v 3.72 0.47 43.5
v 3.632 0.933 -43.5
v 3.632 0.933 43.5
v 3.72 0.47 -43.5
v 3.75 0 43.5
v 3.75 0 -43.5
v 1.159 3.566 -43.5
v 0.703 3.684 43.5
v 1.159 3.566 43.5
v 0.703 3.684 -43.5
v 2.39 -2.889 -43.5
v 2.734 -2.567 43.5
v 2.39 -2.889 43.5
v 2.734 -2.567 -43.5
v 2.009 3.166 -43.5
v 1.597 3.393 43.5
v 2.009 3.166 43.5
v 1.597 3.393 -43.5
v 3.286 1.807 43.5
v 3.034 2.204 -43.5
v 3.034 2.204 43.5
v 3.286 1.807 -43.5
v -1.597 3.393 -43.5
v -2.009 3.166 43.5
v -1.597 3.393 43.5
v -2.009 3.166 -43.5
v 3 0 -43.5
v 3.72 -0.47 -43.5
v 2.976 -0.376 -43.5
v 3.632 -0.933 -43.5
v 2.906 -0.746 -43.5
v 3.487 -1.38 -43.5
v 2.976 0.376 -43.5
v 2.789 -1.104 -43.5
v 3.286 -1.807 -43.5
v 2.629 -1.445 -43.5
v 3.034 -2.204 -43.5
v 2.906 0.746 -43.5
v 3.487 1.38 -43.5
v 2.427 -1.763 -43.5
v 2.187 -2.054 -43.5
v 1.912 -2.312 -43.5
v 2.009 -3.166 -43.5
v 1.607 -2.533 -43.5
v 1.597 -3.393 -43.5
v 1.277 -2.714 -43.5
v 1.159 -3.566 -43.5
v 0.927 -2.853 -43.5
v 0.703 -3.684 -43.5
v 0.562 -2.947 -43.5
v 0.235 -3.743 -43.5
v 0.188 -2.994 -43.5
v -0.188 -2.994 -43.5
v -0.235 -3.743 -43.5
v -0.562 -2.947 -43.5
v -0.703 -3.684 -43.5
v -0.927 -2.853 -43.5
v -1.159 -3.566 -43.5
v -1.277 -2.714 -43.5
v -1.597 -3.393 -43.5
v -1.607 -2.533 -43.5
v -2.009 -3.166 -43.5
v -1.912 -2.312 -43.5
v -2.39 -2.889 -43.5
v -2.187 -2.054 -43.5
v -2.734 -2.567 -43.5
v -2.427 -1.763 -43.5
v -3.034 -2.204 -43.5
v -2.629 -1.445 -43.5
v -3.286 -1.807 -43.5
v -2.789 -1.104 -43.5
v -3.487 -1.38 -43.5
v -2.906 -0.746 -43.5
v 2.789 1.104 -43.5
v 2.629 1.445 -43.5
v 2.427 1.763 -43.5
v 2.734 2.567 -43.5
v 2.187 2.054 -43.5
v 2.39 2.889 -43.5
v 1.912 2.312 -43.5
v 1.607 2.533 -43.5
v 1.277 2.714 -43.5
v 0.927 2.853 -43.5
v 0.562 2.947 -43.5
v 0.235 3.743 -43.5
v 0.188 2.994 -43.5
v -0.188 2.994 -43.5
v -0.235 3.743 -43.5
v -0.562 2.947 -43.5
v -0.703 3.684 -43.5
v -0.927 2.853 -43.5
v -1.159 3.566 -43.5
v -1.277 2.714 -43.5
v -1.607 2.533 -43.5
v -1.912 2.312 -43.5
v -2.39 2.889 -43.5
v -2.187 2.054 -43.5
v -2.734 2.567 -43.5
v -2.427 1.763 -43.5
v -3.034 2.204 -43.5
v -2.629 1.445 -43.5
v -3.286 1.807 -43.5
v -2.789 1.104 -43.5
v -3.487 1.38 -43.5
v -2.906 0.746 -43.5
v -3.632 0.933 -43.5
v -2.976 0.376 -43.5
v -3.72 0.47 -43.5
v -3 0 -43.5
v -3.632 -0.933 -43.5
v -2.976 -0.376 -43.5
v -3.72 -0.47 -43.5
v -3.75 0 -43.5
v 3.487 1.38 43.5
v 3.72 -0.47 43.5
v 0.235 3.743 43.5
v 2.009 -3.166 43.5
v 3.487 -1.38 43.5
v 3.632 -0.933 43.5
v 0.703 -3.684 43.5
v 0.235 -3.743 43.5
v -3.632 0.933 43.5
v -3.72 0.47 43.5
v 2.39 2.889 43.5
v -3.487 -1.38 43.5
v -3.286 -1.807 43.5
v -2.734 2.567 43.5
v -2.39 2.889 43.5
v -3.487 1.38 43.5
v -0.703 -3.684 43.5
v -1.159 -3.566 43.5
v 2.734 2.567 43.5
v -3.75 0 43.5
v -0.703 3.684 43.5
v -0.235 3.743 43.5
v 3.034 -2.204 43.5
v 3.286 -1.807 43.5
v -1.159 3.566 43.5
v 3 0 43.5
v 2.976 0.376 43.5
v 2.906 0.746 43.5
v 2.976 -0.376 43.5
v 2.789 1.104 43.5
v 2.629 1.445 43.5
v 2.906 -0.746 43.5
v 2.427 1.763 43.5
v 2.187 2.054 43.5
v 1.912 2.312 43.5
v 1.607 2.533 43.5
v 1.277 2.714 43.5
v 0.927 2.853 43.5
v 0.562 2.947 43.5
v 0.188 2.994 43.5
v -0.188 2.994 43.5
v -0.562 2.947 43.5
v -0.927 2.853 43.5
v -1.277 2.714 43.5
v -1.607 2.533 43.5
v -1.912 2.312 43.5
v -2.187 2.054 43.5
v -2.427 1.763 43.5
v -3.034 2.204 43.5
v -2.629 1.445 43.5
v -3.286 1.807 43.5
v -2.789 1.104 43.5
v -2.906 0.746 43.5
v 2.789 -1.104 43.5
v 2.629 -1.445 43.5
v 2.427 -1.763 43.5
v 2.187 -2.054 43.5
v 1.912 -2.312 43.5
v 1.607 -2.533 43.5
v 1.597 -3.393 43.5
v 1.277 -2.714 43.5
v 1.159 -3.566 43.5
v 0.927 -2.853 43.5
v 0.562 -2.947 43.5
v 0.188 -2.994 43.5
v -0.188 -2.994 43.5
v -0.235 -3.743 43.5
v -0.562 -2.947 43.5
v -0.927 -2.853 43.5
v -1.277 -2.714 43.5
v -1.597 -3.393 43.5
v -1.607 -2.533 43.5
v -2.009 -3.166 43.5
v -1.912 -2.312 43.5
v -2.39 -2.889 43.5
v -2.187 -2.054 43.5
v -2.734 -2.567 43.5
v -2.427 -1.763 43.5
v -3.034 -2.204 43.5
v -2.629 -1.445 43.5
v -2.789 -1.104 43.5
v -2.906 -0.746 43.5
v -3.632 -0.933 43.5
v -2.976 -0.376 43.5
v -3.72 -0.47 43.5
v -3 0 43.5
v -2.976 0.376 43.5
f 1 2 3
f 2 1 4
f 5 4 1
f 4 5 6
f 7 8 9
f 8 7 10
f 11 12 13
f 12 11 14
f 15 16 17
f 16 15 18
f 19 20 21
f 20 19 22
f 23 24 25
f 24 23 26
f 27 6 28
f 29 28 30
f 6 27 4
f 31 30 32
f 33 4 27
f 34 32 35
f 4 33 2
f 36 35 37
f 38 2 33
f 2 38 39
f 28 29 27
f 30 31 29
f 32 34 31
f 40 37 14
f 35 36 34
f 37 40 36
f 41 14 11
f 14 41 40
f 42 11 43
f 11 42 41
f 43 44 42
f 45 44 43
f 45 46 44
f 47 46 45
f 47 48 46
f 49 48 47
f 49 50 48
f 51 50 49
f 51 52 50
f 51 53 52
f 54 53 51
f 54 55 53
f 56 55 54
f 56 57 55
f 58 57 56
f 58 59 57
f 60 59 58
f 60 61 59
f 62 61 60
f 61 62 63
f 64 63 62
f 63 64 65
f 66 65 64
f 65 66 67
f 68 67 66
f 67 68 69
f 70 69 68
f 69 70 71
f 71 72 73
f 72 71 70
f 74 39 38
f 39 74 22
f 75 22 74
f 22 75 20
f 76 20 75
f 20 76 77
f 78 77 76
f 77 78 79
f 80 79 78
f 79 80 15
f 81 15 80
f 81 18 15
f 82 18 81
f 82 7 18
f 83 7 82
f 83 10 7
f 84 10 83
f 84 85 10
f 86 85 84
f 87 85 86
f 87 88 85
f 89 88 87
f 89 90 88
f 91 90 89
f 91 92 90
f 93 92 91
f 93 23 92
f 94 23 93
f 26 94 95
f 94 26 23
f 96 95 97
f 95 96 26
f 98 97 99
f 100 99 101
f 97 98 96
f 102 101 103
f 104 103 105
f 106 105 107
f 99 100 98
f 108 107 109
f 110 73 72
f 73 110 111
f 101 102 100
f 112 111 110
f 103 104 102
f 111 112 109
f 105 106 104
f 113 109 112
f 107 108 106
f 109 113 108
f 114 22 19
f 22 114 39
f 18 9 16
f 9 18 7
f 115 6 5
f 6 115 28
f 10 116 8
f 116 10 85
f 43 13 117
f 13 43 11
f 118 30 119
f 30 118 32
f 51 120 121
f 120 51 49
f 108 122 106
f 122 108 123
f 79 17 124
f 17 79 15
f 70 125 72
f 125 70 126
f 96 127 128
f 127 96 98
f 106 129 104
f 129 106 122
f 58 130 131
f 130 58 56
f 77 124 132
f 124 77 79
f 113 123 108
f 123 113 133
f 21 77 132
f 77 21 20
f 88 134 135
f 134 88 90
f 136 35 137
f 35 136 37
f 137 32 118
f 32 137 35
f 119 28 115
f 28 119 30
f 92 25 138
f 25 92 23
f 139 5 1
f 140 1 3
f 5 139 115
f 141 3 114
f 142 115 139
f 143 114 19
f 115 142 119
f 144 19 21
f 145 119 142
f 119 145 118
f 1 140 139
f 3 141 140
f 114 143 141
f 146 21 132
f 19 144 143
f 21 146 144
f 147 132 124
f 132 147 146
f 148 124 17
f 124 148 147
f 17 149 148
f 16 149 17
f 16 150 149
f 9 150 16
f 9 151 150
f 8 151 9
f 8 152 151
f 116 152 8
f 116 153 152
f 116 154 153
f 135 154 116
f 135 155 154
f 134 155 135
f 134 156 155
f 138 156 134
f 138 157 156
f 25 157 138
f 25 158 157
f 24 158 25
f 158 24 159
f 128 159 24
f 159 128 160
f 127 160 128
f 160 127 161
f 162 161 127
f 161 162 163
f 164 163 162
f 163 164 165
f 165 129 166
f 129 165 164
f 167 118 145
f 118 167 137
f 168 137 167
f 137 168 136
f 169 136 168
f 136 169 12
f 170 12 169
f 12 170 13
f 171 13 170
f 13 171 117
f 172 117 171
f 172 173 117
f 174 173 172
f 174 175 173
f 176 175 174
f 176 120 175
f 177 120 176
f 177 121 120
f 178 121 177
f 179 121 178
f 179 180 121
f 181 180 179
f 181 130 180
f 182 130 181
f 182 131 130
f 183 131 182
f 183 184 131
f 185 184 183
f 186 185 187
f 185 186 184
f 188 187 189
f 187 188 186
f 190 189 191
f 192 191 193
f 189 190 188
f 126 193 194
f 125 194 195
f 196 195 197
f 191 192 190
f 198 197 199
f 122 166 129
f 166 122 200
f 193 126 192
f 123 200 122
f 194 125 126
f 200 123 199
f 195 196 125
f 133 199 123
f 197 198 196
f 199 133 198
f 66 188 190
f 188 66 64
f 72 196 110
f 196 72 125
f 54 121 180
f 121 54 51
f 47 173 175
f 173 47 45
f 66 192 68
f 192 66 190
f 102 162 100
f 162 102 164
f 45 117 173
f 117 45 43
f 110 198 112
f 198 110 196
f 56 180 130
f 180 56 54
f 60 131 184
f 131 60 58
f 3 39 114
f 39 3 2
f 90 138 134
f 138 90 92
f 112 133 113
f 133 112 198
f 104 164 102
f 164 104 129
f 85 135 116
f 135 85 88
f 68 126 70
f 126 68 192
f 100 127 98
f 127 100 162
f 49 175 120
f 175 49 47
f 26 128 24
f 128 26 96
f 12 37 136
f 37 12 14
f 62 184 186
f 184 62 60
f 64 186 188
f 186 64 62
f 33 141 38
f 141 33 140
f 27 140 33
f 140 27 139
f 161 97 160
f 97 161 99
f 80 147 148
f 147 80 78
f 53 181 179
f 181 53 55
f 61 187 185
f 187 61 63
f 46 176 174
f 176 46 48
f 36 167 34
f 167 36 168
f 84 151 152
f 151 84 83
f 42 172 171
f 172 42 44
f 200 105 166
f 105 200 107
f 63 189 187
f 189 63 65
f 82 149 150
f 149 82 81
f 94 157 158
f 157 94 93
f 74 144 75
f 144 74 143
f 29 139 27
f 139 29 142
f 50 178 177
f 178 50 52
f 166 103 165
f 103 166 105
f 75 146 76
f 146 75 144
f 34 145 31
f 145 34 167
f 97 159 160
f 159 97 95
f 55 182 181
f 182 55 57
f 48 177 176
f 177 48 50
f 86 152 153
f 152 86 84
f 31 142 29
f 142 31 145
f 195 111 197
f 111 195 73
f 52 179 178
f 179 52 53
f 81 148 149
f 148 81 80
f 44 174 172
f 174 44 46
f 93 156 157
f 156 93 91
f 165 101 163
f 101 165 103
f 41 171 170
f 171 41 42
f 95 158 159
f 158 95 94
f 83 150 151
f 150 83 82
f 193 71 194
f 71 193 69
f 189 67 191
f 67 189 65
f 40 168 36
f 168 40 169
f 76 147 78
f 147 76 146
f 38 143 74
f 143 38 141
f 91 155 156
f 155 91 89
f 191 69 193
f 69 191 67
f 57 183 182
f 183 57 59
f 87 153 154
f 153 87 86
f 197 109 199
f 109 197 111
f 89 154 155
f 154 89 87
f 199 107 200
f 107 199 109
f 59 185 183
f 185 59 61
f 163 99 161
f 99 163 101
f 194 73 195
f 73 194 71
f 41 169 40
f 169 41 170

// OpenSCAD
$fn = 50;


difference() {
	union() {
		translate(v = [0, 0, -43.5000000000]) {
			cylinder(h = 87, r = 3.7500000000);
		}
	}
	union() {
		translate(v = [0, 0, -100.0000000000]) {
			cylinder(h = 200, r = 3.0000000000);
		}
	}
}
